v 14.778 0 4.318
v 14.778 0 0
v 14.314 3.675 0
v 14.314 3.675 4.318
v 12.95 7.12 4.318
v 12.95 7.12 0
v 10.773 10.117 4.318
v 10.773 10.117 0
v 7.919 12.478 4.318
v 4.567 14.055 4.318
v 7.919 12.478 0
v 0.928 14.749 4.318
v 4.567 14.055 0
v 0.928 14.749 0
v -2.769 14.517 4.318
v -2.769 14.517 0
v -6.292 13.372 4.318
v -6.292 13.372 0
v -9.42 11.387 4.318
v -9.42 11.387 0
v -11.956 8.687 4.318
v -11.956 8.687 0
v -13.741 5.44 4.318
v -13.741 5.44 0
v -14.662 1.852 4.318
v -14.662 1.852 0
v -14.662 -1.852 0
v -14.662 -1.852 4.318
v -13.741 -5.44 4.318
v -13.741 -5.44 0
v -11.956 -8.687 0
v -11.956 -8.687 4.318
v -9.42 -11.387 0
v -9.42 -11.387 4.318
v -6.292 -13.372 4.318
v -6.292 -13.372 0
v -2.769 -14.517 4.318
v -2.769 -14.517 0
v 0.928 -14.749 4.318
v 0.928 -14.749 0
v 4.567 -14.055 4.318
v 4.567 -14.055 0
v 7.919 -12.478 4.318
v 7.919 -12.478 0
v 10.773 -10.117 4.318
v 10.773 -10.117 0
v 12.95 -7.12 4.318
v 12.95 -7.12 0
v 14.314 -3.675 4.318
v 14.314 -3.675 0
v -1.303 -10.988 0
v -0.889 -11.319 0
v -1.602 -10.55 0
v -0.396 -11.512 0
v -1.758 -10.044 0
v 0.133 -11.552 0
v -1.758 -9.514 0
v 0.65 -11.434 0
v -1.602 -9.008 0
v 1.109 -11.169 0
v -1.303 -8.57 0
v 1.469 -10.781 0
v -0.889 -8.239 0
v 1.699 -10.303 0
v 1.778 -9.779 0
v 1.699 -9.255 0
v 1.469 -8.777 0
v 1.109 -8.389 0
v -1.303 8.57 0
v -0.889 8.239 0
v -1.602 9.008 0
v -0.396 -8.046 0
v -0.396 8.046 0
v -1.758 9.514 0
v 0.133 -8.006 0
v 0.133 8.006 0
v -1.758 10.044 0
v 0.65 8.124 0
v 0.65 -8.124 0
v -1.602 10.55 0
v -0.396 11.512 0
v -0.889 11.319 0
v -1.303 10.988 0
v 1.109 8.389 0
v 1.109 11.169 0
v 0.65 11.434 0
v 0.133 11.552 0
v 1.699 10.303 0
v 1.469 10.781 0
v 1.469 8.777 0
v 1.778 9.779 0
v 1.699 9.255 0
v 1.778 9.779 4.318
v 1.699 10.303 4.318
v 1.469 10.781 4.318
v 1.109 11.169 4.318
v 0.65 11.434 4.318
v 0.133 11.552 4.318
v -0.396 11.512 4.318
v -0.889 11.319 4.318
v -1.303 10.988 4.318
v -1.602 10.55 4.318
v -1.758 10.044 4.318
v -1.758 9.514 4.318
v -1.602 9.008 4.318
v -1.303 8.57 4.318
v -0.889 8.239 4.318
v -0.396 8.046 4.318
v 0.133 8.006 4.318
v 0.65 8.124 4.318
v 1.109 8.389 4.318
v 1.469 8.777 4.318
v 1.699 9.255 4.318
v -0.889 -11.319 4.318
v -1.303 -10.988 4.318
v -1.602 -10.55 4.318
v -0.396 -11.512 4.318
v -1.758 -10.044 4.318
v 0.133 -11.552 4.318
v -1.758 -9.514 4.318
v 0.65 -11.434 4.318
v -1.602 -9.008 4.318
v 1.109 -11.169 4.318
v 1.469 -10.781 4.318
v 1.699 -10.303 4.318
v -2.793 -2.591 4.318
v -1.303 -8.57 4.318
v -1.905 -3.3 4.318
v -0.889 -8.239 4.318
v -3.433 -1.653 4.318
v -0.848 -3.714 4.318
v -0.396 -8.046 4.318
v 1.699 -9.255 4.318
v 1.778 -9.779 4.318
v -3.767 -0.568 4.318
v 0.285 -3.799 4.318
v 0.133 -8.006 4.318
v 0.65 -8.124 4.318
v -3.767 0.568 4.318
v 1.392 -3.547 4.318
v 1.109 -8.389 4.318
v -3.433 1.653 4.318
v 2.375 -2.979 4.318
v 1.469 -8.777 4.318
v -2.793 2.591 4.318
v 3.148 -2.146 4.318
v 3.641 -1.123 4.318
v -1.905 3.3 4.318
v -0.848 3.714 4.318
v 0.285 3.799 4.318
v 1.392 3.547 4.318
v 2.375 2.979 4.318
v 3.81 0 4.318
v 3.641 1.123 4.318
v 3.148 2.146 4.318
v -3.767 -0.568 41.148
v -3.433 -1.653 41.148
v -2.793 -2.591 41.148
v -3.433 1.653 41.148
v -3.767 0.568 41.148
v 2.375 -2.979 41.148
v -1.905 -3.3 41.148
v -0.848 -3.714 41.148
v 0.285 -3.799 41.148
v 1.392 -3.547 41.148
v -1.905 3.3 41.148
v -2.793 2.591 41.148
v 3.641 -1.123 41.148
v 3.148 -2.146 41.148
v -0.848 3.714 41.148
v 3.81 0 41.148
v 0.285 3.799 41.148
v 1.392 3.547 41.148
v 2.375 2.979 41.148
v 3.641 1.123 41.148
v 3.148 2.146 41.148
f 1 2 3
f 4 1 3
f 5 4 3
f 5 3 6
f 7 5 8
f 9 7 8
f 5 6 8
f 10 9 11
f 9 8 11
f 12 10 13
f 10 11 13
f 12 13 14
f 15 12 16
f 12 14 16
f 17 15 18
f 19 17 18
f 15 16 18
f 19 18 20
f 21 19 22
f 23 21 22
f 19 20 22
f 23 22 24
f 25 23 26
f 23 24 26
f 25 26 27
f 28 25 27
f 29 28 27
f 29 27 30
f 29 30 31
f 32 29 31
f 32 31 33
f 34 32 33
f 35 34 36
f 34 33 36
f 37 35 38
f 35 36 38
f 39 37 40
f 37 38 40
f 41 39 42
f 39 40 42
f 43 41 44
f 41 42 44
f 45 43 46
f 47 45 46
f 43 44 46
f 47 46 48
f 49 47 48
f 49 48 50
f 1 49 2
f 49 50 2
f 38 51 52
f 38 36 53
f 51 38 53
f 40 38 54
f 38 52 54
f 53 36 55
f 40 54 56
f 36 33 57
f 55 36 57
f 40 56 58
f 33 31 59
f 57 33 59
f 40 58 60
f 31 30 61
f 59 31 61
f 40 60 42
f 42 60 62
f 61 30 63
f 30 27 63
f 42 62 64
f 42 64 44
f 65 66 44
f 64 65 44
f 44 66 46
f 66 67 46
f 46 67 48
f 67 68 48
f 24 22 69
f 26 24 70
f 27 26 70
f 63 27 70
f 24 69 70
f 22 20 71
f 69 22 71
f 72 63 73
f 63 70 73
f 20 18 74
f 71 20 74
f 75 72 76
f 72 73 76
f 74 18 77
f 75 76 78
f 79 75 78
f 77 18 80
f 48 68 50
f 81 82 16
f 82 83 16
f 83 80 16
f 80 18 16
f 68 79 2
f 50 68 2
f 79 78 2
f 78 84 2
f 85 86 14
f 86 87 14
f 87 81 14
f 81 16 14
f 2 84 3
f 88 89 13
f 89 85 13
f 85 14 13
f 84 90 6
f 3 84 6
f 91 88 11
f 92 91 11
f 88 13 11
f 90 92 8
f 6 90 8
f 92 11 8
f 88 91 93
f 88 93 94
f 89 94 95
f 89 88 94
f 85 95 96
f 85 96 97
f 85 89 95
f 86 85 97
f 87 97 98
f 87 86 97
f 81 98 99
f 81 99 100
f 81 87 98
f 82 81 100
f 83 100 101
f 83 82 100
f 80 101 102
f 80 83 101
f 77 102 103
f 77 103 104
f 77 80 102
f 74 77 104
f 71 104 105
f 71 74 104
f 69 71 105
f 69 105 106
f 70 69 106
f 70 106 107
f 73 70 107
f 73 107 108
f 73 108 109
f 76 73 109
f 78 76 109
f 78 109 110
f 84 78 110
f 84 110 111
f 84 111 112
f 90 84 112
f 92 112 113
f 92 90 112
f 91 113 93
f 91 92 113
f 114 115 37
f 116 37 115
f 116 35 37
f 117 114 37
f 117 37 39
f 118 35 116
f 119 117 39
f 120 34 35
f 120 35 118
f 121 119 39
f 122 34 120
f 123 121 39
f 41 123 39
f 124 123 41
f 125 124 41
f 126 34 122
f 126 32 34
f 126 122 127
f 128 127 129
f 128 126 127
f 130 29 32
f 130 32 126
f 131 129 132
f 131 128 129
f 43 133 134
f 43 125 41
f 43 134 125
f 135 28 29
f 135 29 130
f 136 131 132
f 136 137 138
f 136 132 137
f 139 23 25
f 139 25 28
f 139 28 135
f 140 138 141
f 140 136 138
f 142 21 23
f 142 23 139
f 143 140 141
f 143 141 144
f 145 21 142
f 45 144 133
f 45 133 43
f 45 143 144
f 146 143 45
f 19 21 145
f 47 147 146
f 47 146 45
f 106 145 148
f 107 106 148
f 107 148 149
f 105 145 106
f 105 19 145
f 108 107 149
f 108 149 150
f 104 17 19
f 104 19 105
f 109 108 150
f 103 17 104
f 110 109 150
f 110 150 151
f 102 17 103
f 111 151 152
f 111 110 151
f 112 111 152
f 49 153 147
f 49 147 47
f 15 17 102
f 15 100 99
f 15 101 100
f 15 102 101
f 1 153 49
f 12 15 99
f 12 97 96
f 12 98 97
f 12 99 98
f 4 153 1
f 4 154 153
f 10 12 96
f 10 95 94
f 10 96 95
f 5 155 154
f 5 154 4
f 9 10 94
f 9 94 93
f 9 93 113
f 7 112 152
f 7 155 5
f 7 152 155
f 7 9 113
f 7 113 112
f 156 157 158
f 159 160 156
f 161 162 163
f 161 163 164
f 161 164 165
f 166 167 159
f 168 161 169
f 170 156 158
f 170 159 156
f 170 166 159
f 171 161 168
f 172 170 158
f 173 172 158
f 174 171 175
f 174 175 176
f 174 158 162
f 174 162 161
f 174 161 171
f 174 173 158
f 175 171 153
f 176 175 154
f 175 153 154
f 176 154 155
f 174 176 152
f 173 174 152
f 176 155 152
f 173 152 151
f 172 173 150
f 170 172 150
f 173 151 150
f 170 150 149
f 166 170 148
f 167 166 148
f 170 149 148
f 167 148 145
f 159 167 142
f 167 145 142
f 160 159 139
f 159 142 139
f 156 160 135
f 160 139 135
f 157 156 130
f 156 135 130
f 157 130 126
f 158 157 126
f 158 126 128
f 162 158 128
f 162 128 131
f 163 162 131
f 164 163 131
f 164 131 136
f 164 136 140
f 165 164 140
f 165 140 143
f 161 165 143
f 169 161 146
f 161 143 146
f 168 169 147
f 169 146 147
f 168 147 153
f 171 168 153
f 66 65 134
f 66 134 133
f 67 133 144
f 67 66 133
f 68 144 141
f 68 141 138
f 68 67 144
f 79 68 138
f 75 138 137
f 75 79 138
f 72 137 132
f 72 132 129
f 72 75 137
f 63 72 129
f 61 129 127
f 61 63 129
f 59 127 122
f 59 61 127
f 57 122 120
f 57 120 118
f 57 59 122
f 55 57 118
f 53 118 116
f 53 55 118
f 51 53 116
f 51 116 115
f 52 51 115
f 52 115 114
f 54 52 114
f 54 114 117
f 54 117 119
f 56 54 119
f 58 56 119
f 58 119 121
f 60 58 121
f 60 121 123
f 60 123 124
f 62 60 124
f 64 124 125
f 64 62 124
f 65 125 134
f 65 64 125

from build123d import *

# Parameters (mm, degrees)
F0_R     = 14.7784
F0_R_2   = 1.778
F1_DEPTH = 4.318
F2_R     = 3.81
F3_DEPTH = 36.83


with BuildPart() as f1:
    # F0 (on Top) → F1 (new body)
    with BuildSketch(Plane.XY):
        Circle(F0_R)
        with Locations((0, -9.779)):
            Circle(F0_R_2, mode=Mode.SUBTRACT)
        with Locations((0, 9.779)):
            Circle(F0_R_2, mode=Mode.SUBTRACT)
    extrude(amount=F1_DEPTH)

    # F2 (on face) → F3 (join)
    with BuildSketch(Plane.XY.offset(4.318)):
        Circle(F2_R)
    extrude(amount=F3_DEPTH)


solid = f1.part
